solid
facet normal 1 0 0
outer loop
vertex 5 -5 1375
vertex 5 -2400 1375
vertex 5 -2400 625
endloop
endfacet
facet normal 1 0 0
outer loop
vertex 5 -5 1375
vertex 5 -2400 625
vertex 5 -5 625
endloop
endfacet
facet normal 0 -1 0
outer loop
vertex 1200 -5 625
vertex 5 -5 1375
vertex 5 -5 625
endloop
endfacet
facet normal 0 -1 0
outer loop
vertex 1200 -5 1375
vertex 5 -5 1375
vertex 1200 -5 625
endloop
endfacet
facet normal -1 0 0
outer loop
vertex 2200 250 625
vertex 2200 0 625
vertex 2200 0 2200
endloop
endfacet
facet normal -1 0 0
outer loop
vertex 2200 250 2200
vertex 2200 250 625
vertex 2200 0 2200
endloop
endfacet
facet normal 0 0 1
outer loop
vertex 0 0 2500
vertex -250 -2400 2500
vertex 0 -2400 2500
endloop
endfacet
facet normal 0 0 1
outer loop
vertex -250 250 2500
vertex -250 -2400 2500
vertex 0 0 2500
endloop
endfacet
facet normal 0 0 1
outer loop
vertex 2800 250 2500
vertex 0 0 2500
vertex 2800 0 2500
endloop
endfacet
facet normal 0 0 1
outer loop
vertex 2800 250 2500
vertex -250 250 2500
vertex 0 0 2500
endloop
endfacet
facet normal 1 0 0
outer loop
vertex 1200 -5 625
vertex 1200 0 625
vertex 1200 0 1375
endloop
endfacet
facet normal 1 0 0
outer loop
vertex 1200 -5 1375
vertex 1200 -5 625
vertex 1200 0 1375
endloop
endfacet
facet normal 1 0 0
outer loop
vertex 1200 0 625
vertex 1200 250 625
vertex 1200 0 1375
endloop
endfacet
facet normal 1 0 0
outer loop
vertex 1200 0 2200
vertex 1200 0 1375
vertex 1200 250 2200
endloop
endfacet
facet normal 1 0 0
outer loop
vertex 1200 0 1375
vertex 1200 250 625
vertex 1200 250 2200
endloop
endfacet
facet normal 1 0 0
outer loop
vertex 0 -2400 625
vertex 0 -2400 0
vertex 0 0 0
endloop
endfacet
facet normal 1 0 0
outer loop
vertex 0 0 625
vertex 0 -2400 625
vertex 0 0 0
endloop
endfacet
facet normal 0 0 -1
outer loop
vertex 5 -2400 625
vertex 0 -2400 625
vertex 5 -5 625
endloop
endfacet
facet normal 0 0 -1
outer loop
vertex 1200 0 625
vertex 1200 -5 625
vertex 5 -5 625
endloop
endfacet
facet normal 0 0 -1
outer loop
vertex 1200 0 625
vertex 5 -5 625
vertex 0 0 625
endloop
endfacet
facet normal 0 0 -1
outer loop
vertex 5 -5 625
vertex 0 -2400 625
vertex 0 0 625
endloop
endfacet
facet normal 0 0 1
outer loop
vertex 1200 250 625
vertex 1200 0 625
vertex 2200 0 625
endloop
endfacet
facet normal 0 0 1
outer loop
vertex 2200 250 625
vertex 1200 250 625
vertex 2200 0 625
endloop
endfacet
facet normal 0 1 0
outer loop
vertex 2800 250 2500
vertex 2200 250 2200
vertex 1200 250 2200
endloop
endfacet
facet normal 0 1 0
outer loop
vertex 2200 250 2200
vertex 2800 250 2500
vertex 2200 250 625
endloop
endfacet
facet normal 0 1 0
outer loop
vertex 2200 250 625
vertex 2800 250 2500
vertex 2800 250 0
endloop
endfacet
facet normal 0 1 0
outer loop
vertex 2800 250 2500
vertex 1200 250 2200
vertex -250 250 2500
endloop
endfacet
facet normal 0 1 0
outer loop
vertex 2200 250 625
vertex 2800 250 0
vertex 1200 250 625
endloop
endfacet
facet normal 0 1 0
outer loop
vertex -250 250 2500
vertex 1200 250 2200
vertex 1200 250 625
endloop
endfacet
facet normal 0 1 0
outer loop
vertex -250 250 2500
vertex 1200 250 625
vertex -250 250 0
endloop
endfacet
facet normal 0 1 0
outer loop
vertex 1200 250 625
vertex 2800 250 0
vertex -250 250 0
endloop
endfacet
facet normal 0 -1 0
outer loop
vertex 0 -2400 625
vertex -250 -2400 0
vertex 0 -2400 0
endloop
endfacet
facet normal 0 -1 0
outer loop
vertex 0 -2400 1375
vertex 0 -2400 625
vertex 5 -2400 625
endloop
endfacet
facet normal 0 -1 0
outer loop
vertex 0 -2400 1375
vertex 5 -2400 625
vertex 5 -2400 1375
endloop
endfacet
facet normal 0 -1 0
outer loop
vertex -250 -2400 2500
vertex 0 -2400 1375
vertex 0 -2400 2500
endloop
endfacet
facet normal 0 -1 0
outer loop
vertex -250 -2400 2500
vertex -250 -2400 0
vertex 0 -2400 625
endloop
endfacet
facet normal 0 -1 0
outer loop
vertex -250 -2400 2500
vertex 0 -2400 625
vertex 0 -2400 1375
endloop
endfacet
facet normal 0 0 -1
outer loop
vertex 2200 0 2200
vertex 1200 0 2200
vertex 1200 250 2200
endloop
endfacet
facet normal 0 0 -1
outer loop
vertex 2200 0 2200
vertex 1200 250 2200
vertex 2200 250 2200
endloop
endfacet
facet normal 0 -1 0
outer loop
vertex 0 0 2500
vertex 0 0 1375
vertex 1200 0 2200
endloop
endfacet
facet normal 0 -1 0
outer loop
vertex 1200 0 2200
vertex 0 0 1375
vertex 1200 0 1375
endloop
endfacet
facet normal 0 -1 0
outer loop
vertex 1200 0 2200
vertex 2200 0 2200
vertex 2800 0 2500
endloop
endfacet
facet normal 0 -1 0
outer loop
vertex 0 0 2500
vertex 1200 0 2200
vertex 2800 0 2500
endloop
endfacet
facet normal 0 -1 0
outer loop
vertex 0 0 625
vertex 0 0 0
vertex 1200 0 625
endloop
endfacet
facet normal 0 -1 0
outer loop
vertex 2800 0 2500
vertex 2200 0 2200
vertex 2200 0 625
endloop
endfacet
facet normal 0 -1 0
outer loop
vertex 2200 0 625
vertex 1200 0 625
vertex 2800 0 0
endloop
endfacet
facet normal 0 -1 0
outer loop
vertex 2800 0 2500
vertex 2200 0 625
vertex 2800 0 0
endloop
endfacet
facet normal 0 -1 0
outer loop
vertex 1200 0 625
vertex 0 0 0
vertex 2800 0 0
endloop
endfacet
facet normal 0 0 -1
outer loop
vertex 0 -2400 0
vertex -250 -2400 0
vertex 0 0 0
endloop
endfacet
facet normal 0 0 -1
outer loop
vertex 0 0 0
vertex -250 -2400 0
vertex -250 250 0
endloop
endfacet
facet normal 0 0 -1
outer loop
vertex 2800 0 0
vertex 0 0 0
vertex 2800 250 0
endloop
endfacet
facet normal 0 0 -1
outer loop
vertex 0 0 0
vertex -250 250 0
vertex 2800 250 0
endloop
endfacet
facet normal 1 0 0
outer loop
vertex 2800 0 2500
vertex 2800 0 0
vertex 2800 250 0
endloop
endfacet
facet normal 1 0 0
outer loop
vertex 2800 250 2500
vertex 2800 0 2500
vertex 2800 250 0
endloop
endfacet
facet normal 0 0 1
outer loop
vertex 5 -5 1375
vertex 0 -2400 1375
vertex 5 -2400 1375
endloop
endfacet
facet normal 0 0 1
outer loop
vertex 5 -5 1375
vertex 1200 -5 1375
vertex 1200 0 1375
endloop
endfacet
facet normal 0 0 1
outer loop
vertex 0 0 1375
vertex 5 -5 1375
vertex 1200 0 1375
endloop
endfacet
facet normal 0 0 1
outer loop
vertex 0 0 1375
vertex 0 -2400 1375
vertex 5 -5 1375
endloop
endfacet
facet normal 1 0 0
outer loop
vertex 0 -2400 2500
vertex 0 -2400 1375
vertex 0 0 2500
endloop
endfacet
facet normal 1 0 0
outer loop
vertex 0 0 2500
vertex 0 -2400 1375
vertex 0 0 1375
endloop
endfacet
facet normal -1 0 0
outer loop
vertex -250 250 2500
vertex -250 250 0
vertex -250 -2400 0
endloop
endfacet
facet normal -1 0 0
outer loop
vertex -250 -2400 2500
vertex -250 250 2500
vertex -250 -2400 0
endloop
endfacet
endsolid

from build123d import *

# Parameters (mm, degrees)
F1_DEPTH = 2500
F2_W     = 1000
F2_H     = 1575
F3_DEPTH = 250.001
F4_W     = 1200
F4_H     = 750
F5_DEPTH = 5
F7_W     = 2400
F7_H     = 750
F8_DEPTH = 5


with BuildPart() as f1:
    # F0 (on Top) → F1 (new body)
    with BuildSketch(Plane.XY):
        Polygon((0, -2400), (0, 0), (2800, 0), (2800, 250), (-250, 250), (-250, -2400), align=None)
    extrude(amount=F1_DEPTH)

    # F2 (on face) → F3 (cut, through all)
    with BuildSketch(Plane.XZ):
        with Locations((1700, 1412.5)):
            Rectangle(F2_W, F2_H)
    extrude(amount=-F3_DEPTH, mode=Mode.SUBTRACT)

    # F4 (on face) → F5 (join)
    with BuildSketch(Plane.XZ):
        with Locations((600, 1000)):
            Rectangle(F4_W, F4_H)
    extrude(amount=F5_DEPTH)

    # F7 (on face) → F8 (join)
    with BuildSketch(Plane.YZ):
        with Locations((-1200, 1000)):
            Rectangle(F7_W, F7_H)
    extrude(amount=F8_DEPTH)


solid = f1.part
